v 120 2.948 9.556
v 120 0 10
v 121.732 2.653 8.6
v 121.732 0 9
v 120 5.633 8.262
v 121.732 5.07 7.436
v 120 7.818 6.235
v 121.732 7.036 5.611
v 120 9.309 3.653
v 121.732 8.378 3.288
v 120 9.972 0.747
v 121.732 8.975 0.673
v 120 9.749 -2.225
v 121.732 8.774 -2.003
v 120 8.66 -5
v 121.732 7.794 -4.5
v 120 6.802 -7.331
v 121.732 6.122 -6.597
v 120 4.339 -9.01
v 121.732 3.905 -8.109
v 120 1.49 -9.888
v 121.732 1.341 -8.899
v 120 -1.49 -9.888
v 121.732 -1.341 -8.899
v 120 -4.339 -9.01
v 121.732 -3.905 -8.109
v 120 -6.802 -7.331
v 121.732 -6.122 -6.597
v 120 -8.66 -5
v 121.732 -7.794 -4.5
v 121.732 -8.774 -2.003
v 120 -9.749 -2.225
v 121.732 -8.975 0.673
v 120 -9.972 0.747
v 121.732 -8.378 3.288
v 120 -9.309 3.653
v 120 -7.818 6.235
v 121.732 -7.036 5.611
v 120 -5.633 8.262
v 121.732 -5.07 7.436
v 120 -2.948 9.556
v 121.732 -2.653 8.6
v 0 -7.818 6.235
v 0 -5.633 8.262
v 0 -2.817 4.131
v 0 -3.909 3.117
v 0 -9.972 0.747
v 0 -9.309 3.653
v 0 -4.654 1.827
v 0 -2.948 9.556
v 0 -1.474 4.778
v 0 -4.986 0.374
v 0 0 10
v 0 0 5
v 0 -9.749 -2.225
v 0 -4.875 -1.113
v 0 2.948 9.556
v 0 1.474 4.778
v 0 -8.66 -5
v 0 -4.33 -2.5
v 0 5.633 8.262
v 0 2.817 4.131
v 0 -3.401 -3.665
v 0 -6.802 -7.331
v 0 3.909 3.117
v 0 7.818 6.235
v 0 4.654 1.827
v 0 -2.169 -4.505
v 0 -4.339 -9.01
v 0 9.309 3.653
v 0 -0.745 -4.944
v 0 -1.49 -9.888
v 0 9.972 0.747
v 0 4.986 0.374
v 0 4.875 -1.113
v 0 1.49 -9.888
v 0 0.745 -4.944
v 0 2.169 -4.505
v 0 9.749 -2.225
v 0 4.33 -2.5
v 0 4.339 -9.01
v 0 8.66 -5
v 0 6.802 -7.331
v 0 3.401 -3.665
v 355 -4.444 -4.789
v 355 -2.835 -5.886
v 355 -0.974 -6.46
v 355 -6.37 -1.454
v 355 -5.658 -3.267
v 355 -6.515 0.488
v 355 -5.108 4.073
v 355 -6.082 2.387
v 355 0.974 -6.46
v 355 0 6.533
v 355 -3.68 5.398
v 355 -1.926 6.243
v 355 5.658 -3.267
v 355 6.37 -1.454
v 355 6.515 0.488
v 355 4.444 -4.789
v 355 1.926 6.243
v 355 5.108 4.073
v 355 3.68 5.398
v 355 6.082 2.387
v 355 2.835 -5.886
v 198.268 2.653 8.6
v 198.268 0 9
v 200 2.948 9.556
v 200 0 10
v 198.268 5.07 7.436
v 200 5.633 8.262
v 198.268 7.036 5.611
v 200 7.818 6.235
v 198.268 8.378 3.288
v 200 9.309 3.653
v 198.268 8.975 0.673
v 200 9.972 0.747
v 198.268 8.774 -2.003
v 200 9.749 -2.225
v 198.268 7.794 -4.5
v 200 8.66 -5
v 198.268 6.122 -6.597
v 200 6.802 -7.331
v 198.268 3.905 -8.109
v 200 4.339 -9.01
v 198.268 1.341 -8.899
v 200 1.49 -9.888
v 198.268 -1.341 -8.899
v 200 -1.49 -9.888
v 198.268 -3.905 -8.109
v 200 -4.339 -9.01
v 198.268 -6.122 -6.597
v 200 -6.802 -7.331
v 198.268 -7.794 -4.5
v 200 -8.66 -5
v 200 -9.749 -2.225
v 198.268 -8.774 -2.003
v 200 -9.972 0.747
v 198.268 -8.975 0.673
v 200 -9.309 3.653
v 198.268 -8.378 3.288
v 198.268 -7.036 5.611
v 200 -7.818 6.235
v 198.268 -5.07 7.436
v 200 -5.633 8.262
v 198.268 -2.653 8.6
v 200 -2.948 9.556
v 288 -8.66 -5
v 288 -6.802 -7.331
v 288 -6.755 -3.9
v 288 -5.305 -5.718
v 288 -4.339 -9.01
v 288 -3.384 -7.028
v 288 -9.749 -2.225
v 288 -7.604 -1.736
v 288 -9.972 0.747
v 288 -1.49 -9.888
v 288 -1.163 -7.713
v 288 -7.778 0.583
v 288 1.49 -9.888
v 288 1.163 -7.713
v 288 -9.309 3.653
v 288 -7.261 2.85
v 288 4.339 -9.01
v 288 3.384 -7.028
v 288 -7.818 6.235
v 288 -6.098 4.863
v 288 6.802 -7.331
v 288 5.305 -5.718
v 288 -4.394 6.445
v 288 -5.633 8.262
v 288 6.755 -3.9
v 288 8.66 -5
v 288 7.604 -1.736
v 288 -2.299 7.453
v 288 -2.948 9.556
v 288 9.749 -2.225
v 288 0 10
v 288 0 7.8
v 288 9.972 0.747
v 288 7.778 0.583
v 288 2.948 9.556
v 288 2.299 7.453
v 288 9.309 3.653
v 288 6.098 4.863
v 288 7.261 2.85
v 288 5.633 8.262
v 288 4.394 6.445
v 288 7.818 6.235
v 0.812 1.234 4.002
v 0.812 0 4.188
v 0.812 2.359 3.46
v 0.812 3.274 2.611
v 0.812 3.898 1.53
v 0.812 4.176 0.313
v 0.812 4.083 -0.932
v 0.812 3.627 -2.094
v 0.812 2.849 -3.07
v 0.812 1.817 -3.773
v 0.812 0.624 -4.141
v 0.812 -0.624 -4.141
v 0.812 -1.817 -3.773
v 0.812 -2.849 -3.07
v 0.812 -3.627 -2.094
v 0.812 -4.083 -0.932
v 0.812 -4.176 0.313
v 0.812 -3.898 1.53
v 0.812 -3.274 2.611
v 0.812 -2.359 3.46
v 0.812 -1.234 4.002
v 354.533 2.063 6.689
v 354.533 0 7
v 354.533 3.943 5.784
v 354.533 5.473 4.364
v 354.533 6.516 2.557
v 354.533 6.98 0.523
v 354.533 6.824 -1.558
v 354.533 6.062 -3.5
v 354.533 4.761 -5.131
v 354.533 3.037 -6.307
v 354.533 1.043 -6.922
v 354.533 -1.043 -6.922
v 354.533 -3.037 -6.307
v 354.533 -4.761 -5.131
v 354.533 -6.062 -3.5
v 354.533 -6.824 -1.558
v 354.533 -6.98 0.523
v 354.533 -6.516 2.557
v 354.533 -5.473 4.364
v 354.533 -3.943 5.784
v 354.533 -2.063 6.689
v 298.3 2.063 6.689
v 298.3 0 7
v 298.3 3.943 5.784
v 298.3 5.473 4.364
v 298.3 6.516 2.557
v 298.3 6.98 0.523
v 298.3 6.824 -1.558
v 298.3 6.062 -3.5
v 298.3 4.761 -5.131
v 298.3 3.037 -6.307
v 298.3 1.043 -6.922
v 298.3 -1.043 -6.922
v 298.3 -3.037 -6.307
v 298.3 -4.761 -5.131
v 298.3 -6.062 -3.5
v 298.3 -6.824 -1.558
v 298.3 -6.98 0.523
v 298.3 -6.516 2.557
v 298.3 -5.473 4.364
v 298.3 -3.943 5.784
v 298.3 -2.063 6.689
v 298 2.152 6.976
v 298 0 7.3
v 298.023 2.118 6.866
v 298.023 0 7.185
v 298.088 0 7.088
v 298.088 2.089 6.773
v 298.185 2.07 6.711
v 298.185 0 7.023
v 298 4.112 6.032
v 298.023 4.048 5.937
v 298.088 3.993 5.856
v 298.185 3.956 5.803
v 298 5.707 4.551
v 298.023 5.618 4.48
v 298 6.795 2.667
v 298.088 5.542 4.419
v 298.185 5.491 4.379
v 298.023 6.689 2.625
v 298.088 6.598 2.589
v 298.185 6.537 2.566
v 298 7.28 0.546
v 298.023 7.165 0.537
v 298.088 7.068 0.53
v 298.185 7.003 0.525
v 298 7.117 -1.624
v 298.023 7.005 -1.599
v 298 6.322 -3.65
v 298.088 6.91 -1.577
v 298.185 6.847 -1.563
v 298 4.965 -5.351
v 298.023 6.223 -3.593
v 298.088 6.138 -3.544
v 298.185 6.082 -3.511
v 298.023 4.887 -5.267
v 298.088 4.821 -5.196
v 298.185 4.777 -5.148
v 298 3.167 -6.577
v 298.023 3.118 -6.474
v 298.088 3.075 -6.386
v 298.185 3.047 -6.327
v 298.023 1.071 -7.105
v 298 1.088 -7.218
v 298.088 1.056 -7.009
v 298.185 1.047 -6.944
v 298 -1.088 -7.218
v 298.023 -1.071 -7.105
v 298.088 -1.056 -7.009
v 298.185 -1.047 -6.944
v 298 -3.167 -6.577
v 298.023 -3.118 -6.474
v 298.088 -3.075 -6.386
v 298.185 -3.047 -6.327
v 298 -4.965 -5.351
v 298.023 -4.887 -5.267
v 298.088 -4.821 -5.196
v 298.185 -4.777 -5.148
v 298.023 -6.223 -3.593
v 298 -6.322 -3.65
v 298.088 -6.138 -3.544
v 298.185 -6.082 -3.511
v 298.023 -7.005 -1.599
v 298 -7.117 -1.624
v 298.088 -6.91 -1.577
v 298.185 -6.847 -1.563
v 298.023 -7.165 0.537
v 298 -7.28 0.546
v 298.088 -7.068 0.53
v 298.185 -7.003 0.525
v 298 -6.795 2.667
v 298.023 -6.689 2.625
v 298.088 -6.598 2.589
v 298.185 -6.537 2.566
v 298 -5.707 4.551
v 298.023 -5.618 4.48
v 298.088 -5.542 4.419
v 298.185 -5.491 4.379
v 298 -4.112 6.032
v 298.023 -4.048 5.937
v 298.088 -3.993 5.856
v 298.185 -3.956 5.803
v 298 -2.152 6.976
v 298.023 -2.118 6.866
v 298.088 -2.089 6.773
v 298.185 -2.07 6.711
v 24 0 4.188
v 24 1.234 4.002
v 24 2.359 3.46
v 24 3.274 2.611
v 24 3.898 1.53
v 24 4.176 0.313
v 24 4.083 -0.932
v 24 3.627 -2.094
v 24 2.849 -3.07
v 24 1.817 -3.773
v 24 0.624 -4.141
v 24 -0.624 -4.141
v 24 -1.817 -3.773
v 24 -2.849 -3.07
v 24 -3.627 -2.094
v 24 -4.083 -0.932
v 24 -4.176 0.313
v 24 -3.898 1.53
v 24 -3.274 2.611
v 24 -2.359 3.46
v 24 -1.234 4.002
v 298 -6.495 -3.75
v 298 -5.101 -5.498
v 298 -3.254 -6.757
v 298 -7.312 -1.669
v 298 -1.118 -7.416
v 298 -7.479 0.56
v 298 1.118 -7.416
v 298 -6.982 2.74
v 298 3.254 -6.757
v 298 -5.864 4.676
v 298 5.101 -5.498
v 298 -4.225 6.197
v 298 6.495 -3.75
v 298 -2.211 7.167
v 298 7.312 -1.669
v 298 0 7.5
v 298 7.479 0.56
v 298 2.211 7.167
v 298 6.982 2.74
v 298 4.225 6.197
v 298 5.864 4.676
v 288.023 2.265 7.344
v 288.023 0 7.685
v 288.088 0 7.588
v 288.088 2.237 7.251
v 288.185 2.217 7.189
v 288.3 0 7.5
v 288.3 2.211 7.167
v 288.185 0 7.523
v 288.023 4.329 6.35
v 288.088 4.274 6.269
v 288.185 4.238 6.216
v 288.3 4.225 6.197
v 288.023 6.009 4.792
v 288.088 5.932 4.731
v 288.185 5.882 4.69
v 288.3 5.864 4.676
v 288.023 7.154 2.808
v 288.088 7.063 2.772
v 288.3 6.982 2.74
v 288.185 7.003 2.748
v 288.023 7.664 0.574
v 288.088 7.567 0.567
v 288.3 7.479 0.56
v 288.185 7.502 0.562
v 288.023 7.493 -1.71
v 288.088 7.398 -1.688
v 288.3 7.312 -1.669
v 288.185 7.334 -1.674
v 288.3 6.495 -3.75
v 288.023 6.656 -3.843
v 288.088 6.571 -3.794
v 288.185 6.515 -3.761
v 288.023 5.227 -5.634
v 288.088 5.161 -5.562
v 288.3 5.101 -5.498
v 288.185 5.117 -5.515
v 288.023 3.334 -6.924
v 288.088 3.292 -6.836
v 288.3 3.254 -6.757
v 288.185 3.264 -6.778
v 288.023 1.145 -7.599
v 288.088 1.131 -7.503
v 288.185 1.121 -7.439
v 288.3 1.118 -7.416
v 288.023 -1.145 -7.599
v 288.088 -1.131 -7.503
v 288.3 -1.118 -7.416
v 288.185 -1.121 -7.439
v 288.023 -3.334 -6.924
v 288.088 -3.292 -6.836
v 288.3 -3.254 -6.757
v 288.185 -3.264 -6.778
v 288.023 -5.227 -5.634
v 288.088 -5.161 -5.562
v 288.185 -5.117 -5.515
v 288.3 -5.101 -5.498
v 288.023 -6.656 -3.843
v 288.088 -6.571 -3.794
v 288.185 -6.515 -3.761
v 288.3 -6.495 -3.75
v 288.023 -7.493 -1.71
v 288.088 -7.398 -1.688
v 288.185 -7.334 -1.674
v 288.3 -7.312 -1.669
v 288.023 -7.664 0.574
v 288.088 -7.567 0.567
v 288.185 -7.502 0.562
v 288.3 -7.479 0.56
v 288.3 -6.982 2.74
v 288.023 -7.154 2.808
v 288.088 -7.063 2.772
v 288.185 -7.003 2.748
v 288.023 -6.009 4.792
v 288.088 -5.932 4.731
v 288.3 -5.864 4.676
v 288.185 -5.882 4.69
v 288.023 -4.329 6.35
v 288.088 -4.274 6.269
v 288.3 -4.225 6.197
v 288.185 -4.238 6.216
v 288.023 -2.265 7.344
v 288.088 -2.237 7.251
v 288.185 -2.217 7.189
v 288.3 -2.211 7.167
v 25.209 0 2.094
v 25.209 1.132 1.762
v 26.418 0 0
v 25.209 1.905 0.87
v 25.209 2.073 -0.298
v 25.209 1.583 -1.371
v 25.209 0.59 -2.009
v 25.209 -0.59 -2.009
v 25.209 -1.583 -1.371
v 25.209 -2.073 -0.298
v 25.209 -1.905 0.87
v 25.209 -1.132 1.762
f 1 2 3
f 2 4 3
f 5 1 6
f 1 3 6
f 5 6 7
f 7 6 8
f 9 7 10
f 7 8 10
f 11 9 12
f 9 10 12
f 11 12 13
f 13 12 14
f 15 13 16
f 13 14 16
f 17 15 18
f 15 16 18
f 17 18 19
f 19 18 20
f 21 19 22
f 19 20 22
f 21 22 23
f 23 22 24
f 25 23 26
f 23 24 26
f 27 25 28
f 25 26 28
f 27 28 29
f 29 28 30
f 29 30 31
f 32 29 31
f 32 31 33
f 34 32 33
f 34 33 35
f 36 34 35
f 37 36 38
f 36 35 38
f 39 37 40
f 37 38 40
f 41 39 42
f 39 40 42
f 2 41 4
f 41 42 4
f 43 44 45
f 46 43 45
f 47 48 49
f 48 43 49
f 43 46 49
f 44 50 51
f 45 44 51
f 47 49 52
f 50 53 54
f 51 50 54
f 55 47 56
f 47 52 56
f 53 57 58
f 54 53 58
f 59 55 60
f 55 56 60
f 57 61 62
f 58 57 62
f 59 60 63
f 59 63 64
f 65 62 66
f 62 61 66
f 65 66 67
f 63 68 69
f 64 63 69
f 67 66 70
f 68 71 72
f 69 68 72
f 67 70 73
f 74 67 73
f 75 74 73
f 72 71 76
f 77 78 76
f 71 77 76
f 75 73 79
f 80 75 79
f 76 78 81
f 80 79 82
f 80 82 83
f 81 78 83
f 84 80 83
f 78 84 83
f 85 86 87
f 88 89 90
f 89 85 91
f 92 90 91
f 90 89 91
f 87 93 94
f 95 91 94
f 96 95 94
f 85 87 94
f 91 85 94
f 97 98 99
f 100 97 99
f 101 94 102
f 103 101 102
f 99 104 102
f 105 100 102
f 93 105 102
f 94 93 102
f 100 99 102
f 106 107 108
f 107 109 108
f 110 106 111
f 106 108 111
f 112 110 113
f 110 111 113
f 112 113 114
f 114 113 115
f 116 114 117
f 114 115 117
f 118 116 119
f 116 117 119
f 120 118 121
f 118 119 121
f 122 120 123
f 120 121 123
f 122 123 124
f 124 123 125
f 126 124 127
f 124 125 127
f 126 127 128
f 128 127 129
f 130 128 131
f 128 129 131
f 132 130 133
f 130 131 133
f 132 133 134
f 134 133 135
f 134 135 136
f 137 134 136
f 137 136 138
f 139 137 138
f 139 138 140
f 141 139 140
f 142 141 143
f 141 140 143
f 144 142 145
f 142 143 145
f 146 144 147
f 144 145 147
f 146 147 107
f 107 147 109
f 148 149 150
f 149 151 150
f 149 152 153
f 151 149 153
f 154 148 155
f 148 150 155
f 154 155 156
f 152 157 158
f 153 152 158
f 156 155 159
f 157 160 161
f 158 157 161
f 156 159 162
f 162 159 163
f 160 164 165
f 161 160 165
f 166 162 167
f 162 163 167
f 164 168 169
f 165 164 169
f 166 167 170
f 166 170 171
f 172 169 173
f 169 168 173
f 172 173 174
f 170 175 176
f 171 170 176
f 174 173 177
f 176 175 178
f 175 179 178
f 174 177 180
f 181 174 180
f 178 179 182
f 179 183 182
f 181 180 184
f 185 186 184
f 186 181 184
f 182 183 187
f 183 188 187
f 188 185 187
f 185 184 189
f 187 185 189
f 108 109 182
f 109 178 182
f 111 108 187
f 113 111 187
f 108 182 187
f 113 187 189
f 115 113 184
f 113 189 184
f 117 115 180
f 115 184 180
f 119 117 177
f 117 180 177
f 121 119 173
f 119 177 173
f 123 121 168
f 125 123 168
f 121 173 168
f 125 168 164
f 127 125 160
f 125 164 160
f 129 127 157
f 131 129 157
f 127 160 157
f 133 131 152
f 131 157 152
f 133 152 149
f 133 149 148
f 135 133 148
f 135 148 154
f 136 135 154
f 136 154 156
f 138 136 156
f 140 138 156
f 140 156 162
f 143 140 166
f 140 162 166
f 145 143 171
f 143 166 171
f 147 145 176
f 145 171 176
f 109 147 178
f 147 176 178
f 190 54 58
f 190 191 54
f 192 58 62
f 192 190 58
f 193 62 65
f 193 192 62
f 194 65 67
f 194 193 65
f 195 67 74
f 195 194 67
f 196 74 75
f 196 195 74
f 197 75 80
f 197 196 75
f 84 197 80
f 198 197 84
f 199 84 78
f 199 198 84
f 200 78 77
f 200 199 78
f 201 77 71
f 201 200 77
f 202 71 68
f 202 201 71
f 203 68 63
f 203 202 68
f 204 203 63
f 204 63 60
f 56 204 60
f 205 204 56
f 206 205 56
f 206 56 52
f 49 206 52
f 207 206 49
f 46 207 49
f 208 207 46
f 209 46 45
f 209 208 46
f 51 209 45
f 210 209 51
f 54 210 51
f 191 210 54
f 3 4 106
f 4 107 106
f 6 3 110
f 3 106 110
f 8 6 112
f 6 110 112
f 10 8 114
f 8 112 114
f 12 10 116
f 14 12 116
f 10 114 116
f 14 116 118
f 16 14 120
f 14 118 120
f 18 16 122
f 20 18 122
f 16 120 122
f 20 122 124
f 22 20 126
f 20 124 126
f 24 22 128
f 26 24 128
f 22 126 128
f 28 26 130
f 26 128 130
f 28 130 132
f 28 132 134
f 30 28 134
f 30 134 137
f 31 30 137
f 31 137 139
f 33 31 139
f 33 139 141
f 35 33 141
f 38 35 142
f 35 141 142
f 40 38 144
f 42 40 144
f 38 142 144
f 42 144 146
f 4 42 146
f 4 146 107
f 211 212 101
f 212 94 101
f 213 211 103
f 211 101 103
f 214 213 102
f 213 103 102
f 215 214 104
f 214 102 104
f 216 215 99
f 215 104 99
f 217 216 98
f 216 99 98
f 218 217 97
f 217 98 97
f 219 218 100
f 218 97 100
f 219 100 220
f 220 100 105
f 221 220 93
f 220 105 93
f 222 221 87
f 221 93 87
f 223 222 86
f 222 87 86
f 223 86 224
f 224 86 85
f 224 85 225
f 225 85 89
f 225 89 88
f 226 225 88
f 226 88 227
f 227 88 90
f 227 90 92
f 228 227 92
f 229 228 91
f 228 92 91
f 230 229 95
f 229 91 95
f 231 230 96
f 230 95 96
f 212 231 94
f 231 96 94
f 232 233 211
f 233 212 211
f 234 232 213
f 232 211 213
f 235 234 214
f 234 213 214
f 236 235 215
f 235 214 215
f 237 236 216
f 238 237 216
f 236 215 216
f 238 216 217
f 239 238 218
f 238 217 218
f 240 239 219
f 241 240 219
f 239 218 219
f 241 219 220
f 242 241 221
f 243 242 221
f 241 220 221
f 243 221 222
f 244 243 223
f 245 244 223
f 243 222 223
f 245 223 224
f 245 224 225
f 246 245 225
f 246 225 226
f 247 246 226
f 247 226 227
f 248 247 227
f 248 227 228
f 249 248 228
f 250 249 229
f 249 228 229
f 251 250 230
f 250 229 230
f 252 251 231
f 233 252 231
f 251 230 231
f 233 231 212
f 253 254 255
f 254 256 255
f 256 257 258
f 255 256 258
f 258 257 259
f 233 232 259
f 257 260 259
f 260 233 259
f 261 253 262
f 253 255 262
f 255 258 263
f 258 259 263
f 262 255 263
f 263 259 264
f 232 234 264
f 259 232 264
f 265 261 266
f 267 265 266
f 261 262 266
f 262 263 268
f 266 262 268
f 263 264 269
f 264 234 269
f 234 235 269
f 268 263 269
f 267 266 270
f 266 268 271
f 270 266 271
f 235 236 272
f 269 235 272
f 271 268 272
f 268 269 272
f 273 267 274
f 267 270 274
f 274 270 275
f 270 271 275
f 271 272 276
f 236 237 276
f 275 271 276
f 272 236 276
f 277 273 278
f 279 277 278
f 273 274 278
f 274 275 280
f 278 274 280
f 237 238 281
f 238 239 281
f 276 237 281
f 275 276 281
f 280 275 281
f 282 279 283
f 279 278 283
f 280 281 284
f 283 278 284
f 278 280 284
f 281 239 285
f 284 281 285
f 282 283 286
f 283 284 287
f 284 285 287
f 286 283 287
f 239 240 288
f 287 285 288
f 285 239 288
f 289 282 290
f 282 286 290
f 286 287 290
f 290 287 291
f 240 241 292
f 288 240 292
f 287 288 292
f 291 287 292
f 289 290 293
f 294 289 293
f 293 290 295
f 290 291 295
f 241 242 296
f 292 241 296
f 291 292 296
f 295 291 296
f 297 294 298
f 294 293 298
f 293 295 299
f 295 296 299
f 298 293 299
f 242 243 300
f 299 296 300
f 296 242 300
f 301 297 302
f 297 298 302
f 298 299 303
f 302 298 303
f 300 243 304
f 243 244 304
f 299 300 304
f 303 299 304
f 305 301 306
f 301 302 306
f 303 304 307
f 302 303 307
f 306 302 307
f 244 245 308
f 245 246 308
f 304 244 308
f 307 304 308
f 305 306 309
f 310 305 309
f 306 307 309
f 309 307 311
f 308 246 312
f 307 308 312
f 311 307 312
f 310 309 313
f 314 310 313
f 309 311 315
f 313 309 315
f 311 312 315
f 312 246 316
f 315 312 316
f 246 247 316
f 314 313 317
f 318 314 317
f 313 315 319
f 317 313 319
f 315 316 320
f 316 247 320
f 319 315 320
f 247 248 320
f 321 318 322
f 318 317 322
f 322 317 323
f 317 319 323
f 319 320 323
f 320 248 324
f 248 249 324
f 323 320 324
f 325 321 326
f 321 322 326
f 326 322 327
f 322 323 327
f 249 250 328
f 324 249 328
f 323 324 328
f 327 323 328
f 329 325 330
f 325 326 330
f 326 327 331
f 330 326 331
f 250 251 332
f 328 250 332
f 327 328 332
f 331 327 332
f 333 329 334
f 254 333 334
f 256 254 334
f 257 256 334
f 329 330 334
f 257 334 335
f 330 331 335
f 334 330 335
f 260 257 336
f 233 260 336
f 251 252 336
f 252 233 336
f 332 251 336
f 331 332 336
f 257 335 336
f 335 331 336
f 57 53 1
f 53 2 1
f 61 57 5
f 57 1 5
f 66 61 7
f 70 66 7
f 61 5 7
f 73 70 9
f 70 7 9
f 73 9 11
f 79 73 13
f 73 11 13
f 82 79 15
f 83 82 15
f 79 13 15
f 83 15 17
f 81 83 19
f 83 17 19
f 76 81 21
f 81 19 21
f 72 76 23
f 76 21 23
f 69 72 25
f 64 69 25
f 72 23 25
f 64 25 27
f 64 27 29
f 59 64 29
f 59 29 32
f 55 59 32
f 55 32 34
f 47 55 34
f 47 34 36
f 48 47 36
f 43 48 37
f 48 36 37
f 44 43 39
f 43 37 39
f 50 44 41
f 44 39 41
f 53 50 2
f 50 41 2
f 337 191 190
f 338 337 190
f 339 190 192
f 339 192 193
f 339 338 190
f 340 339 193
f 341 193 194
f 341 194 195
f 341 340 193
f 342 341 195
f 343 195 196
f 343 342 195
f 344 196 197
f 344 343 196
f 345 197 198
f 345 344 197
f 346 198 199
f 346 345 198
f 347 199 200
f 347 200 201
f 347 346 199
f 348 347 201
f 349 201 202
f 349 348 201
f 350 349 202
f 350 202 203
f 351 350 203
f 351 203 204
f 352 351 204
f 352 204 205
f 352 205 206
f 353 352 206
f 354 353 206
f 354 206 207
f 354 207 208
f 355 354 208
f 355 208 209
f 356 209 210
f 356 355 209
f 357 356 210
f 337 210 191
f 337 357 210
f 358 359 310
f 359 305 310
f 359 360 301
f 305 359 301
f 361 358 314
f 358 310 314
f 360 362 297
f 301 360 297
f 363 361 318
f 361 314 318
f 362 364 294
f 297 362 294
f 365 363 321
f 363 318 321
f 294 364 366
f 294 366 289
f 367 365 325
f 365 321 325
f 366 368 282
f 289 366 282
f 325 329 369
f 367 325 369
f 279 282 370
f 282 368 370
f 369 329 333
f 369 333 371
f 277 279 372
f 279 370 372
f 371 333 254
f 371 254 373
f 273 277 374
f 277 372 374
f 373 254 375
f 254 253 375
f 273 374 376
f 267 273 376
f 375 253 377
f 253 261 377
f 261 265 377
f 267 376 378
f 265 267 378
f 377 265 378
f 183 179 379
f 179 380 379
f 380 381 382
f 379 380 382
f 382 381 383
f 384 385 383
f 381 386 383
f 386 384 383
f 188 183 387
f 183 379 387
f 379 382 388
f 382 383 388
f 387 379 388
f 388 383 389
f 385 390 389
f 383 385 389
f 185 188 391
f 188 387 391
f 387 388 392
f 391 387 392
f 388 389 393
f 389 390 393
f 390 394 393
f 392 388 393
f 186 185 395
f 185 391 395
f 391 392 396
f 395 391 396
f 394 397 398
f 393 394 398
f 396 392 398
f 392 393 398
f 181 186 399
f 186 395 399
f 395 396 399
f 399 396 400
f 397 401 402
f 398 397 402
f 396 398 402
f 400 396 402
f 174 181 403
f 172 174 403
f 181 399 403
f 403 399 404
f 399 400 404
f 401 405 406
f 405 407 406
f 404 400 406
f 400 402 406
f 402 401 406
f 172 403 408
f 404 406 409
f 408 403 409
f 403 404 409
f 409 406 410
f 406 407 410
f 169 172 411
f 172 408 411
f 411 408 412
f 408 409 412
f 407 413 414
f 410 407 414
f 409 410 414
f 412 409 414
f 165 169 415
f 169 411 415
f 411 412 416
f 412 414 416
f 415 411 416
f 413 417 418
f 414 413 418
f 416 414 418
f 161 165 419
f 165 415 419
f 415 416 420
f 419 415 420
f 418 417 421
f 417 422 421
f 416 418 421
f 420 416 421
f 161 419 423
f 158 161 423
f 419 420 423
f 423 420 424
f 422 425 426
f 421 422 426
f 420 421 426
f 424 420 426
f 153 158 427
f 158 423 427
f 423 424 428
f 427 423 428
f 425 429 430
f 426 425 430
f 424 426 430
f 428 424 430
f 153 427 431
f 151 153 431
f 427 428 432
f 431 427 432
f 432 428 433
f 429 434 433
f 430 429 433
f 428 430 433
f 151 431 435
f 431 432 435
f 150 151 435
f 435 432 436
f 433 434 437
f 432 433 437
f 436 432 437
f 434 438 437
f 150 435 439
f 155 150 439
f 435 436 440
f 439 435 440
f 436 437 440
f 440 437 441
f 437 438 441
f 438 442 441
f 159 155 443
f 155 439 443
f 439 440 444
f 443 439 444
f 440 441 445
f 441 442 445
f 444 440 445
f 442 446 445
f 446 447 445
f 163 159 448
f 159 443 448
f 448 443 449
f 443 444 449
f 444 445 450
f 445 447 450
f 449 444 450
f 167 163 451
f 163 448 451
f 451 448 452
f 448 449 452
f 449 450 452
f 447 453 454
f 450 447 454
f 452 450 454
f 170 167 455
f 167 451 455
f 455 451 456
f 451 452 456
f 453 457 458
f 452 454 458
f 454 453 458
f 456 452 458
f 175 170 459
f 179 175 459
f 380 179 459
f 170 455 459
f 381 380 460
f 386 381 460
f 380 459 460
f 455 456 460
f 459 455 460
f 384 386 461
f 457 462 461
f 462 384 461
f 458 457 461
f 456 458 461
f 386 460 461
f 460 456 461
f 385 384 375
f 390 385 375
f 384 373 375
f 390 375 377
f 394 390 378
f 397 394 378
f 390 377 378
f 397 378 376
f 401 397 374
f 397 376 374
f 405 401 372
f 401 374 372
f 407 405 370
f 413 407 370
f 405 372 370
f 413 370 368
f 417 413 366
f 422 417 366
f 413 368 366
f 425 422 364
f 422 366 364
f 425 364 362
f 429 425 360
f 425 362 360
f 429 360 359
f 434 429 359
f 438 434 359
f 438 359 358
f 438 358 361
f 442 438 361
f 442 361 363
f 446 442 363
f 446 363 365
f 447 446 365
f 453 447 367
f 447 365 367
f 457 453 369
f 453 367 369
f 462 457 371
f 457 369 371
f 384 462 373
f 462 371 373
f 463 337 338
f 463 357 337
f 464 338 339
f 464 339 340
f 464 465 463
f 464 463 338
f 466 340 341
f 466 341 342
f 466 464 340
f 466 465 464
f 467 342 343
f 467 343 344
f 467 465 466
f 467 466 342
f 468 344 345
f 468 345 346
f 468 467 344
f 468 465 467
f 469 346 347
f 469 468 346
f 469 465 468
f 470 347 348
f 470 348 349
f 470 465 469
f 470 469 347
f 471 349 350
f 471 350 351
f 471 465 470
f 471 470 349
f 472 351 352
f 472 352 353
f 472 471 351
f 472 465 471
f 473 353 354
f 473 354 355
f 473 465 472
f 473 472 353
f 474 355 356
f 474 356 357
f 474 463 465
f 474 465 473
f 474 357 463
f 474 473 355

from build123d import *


with BuildPart() as part:
    # 草图1 → 旋转1 (revolve)
    with BuildSketch(Plane.XY):
        with BuildLine():
            Line((288, 0), (288, 7.8))
            ThreePointArc((288, 7.8), (288.087867966, 7.587867966), (288.3, 7.5))
            Line((288.3, 7.5), (298, 7.5))
            Line((298, 7.5), (298, 7.3))
            ThreePointArc((298, 7.3), (298.087867966, 7.087867966), (298.3, 7))
            Line((298.3, 7), (354.533333333, 7))
            Line((354.533333333, 7), (355, 6.533333333))
            Line((355, 6.533333333), (355, 0))
            Line((355, 0), (288, 0))
        make_face()
    revolve(axis=Axis((355, 0, 0), (-1, 0, 0)))

    # 草图2 → 旋转2 (revolve)
    with BuildSketch(Plane.XY):
        Polygon((0, 0), (0, 10), (120, 10), (121.732050808, 9), (198.267949192, 9), (200, 10), (288, 10), (288, 0), align=None)
    revolve(axis=Axis((288, 0, 0), (-1, 0, 0)))

    # 草图3 → 切除-旋转1 (revolve, cut)
    with BuildSketch(Plane.XY):
        Polygon((0, 0), (0, 5), (0.812, 4.188), (24, 4.188), (26.417942927, 0), align=None)
    revolve(axis=Axis((26.417942927, 0, 0), (-1, 0, 0)), mode=Mode.SUBTRACT)


solid = part.part
